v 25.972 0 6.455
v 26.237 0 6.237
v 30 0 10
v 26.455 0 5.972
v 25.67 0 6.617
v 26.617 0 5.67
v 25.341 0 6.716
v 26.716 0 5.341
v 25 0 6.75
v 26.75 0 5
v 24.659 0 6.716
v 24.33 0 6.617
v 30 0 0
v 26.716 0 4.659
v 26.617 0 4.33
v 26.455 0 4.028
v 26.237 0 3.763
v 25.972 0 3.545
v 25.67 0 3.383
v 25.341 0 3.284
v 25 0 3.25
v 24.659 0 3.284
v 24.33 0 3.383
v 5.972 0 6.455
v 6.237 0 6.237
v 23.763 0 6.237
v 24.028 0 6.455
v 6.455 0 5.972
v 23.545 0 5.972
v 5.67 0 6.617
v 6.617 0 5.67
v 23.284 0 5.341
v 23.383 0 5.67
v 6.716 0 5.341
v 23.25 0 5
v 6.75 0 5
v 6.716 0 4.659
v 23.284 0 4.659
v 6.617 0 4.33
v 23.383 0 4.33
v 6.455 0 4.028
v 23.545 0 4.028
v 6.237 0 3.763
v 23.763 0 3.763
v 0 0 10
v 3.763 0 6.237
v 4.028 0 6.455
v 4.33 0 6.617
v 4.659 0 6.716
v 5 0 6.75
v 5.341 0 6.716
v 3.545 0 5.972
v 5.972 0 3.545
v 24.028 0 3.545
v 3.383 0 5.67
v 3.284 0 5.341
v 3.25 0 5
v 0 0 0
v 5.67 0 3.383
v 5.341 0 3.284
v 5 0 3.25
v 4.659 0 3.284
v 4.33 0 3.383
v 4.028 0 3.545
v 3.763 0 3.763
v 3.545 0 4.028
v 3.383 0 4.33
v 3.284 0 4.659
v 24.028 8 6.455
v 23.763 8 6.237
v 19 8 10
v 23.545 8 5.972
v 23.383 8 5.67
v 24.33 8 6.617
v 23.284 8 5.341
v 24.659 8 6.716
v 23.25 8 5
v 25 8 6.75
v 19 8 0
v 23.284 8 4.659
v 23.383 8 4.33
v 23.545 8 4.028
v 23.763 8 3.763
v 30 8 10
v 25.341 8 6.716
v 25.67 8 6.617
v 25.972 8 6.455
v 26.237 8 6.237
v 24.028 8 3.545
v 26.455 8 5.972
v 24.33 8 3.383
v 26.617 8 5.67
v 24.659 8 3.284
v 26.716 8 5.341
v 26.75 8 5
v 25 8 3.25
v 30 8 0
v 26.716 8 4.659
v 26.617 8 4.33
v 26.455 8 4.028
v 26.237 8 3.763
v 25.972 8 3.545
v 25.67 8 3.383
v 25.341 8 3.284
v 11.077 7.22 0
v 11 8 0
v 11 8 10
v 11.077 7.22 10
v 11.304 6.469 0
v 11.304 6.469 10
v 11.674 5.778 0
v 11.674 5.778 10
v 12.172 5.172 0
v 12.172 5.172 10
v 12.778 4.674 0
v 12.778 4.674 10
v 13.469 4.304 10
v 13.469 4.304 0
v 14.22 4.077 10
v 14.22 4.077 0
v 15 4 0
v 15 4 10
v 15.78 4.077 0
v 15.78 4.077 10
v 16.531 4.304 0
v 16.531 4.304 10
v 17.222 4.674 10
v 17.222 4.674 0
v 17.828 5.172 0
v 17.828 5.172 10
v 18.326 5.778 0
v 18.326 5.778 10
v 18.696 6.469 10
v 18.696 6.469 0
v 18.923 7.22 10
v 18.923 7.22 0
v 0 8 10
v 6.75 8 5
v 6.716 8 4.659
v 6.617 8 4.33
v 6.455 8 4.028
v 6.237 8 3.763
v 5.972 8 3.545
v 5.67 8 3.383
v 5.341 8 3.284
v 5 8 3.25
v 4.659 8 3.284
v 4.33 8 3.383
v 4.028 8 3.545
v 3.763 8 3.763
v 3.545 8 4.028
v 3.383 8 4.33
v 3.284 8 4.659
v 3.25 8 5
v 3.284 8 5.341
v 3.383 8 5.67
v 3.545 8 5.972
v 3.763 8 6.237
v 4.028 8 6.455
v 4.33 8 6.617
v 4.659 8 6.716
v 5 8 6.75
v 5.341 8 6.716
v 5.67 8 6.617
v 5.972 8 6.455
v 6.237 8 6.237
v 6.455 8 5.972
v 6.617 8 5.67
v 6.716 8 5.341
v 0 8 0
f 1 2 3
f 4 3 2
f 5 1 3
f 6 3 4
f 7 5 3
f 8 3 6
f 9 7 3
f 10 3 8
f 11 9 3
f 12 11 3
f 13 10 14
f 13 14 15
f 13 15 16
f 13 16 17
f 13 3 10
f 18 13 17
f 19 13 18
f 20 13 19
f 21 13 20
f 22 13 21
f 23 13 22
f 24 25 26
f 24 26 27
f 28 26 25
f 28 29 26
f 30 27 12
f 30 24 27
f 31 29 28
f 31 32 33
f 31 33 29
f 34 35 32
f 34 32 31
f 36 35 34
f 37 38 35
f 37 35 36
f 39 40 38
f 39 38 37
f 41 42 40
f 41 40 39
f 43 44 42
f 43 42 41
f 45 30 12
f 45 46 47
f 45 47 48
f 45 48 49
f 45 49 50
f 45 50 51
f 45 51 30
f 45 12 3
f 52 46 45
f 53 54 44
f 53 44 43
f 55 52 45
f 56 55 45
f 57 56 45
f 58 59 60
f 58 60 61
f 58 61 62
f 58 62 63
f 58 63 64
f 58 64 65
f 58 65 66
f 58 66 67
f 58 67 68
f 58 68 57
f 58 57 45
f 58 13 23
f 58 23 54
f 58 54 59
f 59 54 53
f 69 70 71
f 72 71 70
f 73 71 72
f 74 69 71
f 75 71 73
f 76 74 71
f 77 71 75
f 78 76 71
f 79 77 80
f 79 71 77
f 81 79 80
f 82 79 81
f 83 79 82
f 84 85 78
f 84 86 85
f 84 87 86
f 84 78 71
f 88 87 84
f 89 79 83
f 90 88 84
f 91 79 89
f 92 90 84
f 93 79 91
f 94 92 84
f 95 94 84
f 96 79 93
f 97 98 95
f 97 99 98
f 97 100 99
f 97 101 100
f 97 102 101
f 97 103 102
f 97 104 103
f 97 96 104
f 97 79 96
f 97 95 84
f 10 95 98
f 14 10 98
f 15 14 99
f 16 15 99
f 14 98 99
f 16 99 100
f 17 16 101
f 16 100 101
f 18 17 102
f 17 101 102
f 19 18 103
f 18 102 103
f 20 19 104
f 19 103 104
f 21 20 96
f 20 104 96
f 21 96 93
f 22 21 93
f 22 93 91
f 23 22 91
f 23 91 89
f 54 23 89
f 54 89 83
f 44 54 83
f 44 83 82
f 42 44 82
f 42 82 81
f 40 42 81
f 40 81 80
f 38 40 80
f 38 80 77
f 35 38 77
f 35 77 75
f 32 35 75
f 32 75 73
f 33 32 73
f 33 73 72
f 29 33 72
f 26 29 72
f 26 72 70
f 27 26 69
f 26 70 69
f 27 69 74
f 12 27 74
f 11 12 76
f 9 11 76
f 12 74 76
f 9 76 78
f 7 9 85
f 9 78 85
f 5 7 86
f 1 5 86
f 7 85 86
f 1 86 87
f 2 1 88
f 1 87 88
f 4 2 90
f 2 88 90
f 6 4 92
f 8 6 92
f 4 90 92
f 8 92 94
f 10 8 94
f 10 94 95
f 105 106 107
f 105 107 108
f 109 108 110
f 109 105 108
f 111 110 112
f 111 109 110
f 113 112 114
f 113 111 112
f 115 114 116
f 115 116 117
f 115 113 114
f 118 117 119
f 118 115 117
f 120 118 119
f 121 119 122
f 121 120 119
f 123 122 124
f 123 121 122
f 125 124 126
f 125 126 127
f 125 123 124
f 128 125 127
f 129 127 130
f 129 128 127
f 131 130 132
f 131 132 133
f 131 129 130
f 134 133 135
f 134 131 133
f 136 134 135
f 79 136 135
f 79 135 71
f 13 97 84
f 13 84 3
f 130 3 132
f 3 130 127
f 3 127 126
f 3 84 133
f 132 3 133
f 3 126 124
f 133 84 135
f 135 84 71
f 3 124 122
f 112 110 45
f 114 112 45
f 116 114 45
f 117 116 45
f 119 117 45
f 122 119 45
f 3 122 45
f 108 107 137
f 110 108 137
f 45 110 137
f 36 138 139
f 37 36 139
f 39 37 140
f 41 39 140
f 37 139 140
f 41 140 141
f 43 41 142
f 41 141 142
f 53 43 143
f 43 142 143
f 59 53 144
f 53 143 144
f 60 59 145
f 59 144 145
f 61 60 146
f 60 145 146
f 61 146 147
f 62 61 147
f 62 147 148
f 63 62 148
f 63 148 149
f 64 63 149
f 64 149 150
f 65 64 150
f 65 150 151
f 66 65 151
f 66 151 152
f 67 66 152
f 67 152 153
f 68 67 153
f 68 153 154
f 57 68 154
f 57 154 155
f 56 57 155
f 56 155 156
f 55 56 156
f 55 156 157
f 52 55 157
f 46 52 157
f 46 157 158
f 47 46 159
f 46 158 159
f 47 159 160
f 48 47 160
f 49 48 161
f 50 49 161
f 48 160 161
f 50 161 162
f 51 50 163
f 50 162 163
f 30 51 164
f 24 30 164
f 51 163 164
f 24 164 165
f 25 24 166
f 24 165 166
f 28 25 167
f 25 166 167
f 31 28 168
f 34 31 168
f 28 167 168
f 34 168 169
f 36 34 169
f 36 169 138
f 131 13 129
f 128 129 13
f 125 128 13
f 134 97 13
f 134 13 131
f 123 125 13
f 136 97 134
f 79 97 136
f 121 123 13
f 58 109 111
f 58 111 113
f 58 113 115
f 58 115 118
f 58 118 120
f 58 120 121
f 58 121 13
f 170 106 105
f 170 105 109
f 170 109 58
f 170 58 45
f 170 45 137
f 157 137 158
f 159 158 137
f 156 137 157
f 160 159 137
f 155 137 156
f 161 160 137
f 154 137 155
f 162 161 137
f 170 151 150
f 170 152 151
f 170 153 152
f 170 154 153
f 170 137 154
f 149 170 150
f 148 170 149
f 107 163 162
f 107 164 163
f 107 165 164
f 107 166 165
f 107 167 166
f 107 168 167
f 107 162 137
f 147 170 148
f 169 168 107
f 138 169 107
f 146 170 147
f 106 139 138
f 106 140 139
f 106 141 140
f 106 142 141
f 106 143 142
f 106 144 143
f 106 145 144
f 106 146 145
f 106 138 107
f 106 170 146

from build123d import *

# Parameters (mm, degrees)
AUFSATZ_LINEAR_AUSTRAGEN1_DEPTH  = 10
F_3_5_3_5_DURCHMESSER_BOHRUNG2_D = 3.5


with BuildPart() as part:
    # Skizze1 → Aufsatz-Linear austragen1 (new body)
    with BuildSketch(Plane.XY):
        with BuildLine():
            Line((19, 8), (30, 8))
            Line((30, 8), (30, 0))
            Line((30, 0), (0, 0))
            Line((0, 0), (0, 8))
            Line((0, 8), (11, 8))
            ThreePointArc((11, 8), (15, 4), (19, 8))
        make_face()
    extrude(amount=AUFSATZ_LINEAR_AUSTRAGEN1_DEPTH)

    # Ø3.5 (3.5) Durchmesser Bohrung2 (through all)
    with Locations(Plane(origin=(0, 0, 0), x_dir=(-1, 0, 0), z_dir=(0, -1, 0))):
        with Locations((-5, -5), (-25, -5)):
            Hole(F_3_5_3_5_DURCHMESSER_BOHRUNG2_D / 2)


solid = part.part
